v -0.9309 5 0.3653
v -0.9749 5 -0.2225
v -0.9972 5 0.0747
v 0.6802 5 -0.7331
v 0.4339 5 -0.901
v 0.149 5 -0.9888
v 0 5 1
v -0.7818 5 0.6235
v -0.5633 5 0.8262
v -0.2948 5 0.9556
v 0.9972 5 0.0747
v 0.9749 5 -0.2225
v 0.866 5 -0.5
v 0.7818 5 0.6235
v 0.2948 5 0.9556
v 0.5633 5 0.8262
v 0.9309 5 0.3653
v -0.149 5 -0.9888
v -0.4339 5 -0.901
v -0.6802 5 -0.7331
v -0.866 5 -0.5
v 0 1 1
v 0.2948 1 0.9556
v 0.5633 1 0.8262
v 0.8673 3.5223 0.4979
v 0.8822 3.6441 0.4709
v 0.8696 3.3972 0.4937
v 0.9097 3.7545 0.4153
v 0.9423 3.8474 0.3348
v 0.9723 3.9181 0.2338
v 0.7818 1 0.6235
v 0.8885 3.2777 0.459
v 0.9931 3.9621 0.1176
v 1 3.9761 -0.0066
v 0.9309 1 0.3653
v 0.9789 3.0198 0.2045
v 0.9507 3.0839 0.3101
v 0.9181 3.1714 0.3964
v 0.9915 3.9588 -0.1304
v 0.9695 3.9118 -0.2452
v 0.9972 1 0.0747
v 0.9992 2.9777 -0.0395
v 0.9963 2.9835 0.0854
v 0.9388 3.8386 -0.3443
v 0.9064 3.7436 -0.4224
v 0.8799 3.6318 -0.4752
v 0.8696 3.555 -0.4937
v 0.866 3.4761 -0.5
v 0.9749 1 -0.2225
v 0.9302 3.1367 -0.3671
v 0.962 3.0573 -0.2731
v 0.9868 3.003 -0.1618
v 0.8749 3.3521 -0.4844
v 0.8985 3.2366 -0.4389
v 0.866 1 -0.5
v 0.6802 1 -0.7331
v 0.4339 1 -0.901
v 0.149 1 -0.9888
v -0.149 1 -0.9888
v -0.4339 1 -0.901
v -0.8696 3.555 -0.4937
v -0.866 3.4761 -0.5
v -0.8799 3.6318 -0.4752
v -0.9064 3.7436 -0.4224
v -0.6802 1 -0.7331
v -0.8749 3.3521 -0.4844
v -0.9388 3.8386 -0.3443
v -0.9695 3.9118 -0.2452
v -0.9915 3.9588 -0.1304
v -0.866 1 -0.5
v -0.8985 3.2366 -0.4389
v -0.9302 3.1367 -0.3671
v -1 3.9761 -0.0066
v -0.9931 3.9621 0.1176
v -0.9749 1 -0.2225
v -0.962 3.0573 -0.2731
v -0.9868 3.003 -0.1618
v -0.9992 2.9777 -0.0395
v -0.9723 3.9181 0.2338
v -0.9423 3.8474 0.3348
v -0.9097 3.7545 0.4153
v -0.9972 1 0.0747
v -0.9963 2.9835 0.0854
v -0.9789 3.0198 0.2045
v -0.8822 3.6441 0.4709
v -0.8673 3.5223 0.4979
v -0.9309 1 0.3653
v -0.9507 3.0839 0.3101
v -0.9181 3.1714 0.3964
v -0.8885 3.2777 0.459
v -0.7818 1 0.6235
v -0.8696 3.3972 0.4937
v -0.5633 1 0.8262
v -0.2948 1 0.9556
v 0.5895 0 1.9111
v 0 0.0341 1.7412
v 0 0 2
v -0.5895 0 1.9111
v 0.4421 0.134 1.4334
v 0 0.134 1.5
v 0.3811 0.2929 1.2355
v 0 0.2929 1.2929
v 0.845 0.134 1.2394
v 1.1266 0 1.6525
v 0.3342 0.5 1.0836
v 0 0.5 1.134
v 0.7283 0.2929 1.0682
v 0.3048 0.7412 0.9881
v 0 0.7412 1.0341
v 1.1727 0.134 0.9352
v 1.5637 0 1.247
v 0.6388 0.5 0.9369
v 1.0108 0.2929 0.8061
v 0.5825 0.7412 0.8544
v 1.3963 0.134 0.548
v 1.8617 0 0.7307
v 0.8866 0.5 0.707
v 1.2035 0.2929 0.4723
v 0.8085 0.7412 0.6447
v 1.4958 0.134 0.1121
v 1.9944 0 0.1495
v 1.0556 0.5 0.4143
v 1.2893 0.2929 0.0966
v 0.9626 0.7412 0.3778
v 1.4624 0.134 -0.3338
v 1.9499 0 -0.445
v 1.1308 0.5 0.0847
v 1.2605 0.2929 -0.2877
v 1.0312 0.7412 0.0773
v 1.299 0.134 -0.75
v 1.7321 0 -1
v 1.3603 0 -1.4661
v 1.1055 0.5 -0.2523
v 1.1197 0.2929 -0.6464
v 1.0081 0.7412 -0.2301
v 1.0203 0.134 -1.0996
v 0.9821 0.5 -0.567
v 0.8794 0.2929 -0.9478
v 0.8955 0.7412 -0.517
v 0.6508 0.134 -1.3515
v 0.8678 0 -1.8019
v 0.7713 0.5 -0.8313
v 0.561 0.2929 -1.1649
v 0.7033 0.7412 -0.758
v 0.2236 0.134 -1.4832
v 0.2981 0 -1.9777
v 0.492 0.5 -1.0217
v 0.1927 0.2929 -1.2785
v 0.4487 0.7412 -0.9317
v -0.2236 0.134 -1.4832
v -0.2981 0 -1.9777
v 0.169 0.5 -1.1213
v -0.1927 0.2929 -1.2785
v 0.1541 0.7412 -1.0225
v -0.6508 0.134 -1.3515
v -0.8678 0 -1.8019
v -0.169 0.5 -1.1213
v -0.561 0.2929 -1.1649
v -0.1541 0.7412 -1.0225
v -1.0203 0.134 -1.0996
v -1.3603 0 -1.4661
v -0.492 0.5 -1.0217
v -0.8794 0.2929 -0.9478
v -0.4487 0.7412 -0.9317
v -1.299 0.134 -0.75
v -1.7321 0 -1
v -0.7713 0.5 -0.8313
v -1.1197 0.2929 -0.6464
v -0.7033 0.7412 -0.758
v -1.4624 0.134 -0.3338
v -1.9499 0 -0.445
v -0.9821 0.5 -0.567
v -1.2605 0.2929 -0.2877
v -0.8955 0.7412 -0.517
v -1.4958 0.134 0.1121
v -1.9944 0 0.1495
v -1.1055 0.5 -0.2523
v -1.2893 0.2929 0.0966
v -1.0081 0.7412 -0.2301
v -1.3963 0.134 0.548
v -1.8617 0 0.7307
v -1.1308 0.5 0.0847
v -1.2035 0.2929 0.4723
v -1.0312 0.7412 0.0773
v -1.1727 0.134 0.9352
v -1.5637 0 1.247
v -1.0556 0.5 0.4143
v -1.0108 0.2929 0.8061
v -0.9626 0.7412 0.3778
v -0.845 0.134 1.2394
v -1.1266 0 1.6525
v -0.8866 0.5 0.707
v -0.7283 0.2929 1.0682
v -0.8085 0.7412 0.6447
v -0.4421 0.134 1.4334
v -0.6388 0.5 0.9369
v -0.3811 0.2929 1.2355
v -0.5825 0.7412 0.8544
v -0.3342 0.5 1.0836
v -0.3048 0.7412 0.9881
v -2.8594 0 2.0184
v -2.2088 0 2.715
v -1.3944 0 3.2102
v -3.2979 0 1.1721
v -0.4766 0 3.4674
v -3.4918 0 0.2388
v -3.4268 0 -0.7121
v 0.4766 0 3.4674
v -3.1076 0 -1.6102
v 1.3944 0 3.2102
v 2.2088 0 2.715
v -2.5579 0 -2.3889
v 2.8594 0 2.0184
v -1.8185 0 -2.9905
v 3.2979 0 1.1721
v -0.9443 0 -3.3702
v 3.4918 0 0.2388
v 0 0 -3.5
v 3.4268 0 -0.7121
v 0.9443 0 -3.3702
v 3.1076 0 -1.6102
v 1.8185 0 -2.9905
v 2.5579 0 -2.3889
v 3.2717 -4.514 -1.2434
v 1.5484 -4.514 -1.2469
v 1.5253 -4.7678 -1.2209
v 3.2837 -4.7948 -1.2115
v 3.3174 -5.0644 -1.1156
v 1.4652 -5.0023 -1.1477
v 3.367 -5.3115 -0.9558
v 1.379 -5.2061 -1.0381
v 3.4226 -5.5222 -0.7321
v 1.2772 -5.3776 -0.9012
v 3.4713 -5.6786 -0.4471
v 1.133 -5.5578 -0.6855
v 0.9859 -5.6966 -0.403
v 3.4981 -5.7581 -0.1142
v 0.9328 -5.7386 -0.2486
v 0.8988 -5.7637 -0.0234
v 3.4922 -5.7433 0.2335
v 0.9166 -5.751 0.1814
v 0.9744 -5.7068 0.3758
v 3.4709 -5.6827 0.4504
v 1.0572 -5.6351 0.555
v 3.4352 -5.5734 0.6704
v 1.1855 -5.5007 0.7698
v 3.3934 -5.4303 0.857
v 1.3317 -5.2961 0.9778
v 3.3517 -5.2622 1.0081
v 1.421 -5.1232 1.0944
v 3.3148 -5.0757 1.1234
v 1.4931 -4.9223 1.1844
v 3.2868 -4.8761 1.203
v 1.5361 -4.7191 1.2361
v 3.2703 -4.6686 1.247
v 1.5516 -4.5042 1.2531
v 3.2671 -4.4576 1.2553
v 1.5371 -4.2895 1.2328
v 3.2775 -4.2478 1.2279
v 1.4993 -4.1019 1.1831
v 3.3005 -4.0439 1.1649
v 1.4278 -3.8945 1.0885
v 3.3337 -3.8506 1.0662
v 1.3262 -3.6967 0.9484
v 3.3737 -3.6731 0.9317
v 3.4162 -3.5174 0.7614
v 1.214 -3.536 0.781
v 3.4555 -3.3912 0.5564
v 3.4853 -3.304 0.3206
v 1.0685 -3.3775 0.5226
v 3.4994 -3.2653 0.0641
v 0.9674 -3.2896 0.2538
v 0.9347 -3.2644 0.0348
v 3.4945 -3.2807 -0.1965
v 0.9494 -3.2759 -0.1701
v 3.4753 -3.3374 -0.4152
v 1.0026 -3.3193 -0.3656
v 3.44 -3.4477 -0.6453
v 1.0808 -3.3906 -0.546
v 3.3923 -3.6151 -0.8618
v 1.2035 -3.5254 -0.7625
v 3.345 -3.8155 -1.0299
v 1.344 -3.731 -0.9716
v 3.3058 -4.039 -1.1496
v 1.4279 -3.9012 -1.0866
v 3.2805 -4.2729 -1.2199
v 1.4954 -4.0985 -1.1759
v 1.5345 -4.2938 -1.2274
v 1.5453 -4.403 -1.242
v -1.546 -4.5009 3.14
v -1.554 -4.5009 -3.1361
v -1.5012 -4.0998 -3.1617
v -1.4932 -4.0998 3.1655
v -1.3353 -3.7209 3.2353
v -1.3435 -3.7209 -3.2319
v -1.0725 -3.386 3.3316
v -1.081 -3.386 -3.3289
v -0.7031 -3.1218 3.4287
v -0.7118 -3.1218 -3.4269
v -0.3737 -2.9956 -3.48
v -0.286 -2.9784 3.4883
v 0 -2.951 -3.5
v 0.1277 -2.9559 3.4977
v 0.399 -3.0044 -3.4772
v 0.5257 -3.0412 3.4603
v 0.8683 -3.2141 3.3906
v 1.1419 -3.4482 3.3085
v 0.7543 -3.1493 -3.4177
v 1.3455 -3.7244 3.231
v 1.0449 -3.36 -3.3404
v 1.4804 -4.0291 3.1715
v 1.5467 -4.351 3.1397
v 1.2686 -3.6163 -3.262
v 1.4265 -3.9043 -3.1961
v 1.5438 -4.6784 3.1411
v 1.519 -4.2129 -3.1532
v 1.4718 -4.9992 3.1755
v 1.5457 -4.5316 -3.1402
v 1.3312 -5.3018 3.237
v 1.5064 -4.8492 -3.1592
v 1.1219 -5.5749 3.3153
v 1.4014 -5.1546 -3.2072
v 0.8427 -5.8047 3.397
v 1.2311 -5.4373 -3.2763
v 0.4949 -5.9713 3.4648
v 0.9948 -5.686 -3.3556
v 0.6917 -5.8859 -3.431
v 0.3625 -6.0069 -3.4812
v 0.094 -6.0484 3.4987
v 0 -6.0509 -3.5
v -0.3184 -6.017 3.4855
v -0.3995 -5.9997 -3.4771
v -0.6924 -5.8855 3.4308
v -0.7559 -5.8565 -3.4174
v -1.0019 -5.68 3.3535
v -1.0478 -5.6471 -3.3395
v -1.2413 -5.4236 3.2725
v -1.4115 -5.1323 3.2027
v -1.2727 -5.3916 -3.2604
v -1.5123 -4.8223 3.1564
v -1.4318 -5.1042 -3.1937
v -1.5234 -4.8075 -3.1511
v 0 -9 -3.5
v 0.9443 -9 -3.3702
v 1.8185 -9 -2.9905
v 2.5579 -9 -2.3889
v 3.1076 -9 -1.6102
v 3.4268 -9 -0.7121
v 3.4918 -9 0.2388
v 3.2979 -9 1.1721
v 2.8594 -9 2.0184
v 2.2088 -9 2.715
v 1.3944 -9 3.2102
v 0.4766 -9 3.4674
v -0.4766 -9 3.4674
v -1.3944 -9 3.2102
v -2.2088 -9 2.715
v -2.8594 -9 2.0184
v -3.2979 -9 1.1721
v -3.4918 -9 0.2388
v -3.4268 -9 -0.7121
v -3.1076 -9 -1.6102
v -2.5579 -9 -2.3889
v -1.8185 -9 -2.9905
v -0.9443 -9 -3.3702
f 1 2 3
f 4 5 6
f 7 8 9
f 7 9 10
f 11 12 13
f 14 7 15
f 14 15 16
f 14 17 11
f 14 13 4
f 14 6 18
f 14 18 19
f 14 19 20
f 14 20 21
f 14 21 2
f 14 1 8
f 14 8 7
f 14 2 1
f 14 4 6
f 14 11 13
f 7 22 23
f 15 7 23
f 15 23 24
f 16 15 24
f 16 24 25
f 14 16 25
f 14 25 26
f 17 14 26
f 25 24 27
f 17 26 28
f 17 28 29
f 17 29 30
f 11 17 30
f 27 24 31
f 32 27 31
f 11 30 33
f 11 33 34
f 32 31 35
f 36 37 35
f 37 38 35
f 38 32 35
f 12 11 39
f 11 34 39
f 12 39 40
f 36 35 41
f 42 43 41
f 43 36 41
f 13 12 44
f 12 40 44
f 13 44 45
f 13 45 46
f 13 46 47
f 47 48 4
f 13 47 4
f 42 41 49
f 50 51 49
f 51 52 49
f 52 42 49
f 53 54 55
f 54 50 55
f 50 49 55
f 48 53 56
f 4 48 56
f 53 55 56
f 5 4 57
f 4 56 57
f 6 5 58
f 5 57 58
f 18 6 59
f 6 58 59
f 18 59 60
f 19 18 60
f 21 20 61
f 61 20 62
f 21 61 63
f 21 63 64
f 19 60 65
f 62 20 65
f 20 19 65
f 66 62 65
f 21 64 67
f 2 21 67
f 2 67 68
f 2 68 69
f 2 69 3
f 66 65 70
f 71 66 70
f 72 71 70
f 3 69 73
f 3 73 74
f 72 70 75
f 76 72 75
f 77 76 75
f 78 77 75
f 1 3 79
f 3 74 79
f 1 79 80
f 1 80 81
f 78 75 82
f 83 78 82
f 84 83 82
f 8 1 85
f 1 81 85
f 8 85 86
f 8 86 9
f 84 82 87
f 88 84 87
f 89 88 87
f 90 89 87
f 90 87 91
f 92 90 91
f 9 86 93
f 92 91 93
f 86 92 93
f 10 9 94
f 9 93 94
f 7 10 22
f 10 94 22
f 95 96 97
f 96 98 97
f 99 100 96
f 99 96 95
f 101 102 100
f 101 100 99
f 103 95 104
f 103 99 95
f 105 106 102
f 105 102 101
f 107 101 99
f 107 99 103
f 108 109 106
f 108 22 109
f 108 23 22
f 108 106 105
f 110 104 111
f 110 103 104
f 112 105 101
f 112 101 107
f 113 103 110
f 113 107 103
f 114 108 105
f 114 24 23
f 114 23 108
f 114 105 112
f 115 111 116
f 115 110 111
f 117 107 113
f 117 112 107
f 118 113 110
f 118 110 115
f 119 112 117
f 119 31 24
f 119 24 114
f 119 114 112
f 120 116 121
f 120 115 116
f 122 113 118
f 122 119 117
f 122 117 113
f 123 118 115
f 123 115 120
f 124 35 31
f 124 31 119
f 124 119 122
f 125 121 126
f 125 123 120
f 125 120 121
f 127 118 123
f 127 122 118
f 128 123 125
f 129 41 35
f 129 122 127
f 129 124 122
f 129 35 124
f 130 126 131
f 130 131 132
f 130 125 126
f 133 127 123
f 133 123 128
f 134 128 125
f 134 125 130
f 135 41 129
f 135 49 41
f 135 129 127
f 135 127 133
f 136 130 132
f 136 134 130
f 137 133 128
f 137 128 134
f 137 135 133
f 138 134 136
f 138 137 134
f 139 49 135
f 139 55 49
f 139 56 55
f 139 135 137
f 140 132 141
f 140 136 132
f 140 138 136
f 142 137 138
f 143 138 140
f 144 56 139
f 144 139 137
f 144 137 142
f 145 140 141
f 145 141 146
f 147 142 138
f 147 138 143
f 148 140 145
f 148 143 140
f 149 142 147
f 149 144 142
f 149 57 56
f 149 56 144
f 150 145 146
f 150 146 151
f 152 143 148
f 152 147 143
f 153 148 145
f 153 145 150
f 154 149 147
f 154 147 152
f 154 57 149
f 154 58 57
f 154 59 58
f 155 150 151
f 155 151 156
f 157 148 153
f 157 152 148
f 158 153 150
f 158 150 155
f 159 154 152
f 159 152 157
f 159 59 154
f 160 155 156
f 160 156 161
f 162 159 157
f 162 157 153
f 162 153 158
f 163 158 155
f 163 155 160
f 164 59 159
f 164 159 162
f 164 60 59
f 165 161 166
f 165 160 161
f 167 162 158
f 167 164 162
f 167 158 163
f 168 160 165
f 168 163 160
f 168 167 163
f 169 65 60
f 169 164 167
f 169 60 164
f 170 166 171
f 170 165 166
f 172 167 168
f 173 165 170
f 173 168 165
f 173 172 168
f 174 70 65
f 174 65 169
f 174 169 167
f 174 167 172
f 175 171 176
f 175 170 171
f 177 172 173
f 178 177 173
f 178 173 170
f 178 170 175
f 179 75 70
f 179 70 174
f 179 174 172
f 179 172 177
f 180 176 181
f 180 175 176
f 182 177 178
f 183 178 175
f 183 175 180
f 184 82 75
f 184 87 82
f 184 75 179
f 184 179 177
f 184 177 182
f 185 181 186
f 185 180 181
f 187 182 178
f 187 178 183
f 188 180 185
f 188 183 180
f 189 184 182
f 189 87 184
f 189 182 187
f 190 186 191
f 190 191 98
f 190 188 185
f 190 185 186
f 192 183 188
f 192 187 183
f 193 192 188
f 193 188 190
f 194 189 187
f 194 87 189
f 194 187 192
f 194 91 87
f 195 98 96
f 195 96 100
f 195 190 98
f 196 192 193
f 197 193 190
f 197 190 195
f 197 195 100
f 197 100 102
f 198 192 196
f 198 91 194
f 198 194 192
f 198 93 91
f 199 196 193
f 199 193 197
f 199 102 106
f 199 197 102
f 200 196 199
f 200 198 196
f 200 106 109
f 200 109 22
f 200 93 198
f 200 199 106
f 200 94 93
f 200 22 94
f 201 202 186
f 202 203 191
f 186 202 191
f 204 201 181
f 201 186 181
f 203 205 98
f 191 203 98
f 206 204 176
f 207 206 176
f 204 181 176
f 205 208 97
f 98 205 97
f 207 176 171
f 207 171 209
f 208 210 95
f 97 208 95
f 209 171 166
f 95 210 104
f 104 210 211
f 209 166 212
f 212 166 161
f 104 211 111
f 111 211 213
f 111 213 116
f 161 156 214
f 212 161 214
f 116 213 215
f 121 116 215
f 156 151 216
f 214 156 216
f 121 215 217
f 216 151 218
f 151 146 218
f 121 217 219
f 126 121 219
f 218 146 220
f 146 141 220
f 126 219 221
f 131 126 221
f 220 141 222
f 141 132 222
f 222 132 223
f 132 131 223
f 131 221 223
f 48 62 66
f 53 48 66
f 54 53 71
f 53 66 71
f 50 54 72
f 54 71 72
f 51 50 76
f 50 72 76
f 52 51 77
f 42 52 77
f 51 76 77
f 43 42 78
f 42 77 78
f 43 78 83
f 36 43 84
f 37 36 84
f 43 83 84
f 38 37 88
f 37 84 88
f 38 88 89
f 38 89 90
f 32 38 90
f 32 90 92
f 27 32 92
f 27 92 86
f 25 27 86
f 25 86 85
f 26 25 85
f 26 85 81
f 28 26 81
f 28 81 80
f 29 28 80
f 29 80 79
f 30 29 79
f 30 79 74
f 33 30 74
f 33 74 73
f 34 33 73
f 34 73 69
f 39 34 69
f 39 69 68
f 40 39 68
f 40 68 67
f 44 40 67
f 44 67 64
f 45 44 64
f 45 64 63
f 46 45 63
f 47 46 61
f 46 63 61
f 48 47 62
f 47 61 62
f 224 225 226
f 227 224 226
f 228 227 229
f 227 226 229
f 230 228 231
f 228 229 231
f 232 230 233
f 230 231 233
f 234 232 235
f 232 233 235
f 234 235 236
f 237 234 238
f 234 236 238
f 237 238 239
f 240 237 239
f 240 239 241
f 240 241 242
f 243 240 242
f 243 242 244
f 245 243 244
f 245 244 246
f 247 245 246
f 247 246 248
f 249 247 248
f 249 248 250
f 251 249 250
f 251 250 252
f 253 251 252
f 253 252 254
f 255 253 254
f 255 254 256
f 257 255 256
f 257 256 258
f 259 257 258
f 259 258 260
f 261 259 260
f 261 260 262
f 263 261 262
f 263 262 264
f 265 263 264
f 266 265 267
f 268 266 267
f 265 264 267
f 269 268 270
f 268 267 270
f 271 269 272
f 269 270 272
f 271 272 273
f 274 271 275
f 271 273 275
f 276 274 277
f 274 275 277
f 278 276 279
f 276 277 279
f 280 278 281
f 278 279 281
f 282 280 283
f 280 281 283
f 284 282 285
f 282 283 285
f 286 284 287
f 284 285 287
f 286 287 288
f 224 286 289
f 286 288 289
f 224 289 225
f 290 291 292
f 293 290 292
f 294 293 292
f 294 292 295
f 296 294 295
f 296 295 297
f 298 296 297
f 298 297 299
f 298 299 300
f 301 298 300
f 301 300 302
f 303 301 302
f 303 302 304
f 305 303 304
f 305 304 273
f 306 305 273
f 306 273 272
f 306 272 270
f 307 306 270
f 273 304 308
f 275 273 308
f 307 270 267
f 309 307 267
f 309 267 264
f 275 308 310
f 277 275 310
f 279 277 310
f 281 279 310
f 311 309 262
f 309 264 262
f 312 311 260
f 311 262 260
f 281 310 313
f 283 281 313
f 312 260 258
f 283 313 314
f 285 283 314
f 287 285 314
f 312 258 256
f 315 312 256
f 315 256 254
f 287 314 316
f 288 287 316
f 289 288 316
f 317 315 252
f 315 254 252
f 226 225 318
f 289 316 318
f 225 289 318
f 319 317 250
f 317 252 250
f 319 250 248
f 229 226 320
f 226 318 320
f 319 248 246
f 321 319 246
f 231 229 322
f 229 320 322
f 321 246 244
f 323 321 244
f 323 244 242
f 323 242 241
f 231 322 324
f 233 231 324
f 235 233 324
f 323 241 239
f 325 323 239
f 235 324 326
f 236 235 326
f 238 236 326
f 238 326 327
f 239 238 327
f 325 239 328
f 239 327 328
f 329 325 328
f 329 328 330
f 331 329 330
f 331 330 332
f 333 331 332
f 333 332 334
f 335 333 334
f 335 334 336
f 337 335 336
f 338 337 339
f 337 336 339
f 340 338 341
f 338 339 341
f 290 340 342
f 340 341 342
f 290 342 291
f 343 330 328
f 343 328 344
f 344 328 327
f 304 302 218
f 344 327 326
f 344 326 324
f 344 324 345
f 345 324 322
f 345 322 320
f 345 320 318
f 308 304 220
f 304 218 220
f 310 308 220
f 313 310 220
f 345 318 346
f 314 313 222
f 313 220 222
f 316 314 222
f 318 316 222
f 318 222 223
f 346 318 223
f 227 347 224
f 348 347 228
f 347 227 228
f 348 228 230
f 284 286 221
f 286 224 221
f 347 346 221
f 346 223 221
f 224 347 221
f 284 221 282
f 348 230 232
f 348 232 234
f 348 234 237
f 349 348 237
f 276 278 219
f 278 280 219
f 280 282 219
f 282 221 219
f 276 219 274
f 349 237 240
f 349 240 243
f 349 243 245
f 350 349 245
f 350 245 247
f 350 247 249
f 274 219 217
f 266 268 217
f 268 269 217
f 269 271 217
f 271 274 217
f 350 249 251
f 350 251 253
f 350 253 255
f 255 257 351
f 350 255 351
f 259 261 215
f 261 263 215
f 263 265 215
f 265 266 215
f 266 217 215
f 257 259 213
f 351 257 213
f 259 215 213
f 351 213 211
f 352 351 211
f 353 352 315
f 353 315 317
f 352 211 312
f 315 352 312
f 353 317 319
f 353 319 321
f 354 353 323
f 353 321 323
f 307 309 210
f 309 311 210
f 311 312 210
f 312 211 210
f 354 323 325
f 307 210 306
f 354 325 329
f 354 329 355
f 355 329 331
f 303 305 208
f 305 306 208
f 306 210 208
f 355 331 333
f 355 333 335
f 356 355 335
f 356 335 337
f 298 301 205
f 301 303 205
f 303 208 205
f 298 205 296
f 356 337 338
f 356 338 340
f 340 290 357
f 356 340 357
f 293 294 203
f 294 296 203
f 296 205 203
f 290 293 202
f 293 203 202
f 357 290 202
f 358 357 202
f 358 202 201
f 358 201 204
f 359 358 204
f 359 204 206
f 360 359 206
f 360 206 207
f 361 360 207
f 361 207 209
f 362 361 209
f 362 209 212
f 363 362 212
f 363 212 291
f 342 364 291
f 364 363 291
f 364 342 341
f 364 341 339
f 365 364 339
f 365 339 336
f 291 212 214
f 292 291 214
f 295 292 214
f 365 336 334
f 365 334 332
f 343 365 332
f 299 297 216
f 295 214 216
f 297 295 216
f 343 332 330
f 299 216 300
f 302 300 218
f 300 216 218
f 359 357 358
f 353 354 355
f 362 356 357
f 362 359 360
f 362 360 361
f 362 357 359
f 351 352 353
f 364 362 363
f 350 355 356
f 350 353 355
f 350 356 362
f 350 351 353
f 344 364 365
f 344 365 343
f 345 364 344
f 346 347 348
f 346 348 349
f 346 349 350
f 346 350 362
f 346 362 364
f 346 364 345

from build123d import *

# Parameters (mm, degrees)
SKETCH1_R                 = 1
BOSS_EXTRUDE1_DEPTH       = 5
SKETCH2_R                 = 3.5
BOSS_EXTRUDE2_DEPTH       = 9
F_3_0MM_DOWEL_HOLE1_D     = 3.1
F_3_0MM_DOWEL_HOLE2_D     = 2.5
F_3_0MM_DOWEL_HOLE2_DEPTH = 3
F_3_0MM_DOWEL_HOLE2_TIP   = 0.751075774
F_1_0MM_DOWEL_HOLE1_D     = 1
FILLET1_R                 = 1


with BuildPart() as part:
    # Sketch1 → Boss-Extrude1 (new body)
    with BuildSketch(Plane(origin=(0, 0, 0), x_dir=(1, 0, 0), z_dir=(0, 1, 0))):
        with Locations(Location((0, 0, 0), (0, 0, 270))):
            Circle(SKETCH1_R)
    extrude(amount=BOSS_EXTRUDE1_DEPTH)

    # Sketch2 → Boss-Extrude2 (add)
    with BuildSketch(Plane.XZ):
        with Locations(Location((0, 0, 0), (0, 0, 270))):
            Circle(SKETCH2_R)
    extrude(amount=BOSS_EXTRUDE2_DEPTH)

    # Ø3.0mm Dowel Hole1 (through all)
    with Locations(Plane(origin=(0.004438696, -4.500949112, 3.499997185), x_dir=(0.999999195836, 0, -0.001268198744), z_dir=(0.001268198744, 0, 0.999999195836))):
        with Locations((0, 0)):
            Hole(F_3_0MM_DOWEL_HOLE1_D / 2)

    # Ø3.0mm Dowel Hole2
    with Locations(Plane(origin=(3.499992934, -4.513990385, 0.007032841), x_dir=(-0.002009383102, 0, 0.999997981188), z_dir=(0.999997981188, 0, 0.002009383102))):
        with Locations((0, 0)):
            Hole(F_3_0MM_DOWEL_HOLE2_D / 2, depth=F_3_0MM_DOWEL_HOLE2_DEPTH)
            with Locations((0, 0, -(F_3_0MM_DOWEL_HOLE2_DEPTH + F_3_0MM_DOWEL_HOLE2_TIP / 2))):  # 118° drill point
                Cone(0, F_3_0MM_DOWEL_HOLE2_D / 2, F_3_0MM_DOWEL_HOLE2_TIP, mode=Mode.SUBTRACT)

    # Ø1.0mm Dowel Hole1 (through all)
    with Locations(Plane(origin=(1, 3.476098955, 0), x_dir=(0, 0, 1), z_dir=(1, 0, 0))):
        with Locations((0, 0)):
            Hole(F_1_0MM_DOWEL_HOLE1_D / 2)

    # Fillet1
    fillet1_edges = [part.edges().sort_by_distance(p)[0] for p in [
        (0, 0, -1),
    ]]
    fillet(fillet1_edges, radius=FILLET1_R)


solid = part.part
